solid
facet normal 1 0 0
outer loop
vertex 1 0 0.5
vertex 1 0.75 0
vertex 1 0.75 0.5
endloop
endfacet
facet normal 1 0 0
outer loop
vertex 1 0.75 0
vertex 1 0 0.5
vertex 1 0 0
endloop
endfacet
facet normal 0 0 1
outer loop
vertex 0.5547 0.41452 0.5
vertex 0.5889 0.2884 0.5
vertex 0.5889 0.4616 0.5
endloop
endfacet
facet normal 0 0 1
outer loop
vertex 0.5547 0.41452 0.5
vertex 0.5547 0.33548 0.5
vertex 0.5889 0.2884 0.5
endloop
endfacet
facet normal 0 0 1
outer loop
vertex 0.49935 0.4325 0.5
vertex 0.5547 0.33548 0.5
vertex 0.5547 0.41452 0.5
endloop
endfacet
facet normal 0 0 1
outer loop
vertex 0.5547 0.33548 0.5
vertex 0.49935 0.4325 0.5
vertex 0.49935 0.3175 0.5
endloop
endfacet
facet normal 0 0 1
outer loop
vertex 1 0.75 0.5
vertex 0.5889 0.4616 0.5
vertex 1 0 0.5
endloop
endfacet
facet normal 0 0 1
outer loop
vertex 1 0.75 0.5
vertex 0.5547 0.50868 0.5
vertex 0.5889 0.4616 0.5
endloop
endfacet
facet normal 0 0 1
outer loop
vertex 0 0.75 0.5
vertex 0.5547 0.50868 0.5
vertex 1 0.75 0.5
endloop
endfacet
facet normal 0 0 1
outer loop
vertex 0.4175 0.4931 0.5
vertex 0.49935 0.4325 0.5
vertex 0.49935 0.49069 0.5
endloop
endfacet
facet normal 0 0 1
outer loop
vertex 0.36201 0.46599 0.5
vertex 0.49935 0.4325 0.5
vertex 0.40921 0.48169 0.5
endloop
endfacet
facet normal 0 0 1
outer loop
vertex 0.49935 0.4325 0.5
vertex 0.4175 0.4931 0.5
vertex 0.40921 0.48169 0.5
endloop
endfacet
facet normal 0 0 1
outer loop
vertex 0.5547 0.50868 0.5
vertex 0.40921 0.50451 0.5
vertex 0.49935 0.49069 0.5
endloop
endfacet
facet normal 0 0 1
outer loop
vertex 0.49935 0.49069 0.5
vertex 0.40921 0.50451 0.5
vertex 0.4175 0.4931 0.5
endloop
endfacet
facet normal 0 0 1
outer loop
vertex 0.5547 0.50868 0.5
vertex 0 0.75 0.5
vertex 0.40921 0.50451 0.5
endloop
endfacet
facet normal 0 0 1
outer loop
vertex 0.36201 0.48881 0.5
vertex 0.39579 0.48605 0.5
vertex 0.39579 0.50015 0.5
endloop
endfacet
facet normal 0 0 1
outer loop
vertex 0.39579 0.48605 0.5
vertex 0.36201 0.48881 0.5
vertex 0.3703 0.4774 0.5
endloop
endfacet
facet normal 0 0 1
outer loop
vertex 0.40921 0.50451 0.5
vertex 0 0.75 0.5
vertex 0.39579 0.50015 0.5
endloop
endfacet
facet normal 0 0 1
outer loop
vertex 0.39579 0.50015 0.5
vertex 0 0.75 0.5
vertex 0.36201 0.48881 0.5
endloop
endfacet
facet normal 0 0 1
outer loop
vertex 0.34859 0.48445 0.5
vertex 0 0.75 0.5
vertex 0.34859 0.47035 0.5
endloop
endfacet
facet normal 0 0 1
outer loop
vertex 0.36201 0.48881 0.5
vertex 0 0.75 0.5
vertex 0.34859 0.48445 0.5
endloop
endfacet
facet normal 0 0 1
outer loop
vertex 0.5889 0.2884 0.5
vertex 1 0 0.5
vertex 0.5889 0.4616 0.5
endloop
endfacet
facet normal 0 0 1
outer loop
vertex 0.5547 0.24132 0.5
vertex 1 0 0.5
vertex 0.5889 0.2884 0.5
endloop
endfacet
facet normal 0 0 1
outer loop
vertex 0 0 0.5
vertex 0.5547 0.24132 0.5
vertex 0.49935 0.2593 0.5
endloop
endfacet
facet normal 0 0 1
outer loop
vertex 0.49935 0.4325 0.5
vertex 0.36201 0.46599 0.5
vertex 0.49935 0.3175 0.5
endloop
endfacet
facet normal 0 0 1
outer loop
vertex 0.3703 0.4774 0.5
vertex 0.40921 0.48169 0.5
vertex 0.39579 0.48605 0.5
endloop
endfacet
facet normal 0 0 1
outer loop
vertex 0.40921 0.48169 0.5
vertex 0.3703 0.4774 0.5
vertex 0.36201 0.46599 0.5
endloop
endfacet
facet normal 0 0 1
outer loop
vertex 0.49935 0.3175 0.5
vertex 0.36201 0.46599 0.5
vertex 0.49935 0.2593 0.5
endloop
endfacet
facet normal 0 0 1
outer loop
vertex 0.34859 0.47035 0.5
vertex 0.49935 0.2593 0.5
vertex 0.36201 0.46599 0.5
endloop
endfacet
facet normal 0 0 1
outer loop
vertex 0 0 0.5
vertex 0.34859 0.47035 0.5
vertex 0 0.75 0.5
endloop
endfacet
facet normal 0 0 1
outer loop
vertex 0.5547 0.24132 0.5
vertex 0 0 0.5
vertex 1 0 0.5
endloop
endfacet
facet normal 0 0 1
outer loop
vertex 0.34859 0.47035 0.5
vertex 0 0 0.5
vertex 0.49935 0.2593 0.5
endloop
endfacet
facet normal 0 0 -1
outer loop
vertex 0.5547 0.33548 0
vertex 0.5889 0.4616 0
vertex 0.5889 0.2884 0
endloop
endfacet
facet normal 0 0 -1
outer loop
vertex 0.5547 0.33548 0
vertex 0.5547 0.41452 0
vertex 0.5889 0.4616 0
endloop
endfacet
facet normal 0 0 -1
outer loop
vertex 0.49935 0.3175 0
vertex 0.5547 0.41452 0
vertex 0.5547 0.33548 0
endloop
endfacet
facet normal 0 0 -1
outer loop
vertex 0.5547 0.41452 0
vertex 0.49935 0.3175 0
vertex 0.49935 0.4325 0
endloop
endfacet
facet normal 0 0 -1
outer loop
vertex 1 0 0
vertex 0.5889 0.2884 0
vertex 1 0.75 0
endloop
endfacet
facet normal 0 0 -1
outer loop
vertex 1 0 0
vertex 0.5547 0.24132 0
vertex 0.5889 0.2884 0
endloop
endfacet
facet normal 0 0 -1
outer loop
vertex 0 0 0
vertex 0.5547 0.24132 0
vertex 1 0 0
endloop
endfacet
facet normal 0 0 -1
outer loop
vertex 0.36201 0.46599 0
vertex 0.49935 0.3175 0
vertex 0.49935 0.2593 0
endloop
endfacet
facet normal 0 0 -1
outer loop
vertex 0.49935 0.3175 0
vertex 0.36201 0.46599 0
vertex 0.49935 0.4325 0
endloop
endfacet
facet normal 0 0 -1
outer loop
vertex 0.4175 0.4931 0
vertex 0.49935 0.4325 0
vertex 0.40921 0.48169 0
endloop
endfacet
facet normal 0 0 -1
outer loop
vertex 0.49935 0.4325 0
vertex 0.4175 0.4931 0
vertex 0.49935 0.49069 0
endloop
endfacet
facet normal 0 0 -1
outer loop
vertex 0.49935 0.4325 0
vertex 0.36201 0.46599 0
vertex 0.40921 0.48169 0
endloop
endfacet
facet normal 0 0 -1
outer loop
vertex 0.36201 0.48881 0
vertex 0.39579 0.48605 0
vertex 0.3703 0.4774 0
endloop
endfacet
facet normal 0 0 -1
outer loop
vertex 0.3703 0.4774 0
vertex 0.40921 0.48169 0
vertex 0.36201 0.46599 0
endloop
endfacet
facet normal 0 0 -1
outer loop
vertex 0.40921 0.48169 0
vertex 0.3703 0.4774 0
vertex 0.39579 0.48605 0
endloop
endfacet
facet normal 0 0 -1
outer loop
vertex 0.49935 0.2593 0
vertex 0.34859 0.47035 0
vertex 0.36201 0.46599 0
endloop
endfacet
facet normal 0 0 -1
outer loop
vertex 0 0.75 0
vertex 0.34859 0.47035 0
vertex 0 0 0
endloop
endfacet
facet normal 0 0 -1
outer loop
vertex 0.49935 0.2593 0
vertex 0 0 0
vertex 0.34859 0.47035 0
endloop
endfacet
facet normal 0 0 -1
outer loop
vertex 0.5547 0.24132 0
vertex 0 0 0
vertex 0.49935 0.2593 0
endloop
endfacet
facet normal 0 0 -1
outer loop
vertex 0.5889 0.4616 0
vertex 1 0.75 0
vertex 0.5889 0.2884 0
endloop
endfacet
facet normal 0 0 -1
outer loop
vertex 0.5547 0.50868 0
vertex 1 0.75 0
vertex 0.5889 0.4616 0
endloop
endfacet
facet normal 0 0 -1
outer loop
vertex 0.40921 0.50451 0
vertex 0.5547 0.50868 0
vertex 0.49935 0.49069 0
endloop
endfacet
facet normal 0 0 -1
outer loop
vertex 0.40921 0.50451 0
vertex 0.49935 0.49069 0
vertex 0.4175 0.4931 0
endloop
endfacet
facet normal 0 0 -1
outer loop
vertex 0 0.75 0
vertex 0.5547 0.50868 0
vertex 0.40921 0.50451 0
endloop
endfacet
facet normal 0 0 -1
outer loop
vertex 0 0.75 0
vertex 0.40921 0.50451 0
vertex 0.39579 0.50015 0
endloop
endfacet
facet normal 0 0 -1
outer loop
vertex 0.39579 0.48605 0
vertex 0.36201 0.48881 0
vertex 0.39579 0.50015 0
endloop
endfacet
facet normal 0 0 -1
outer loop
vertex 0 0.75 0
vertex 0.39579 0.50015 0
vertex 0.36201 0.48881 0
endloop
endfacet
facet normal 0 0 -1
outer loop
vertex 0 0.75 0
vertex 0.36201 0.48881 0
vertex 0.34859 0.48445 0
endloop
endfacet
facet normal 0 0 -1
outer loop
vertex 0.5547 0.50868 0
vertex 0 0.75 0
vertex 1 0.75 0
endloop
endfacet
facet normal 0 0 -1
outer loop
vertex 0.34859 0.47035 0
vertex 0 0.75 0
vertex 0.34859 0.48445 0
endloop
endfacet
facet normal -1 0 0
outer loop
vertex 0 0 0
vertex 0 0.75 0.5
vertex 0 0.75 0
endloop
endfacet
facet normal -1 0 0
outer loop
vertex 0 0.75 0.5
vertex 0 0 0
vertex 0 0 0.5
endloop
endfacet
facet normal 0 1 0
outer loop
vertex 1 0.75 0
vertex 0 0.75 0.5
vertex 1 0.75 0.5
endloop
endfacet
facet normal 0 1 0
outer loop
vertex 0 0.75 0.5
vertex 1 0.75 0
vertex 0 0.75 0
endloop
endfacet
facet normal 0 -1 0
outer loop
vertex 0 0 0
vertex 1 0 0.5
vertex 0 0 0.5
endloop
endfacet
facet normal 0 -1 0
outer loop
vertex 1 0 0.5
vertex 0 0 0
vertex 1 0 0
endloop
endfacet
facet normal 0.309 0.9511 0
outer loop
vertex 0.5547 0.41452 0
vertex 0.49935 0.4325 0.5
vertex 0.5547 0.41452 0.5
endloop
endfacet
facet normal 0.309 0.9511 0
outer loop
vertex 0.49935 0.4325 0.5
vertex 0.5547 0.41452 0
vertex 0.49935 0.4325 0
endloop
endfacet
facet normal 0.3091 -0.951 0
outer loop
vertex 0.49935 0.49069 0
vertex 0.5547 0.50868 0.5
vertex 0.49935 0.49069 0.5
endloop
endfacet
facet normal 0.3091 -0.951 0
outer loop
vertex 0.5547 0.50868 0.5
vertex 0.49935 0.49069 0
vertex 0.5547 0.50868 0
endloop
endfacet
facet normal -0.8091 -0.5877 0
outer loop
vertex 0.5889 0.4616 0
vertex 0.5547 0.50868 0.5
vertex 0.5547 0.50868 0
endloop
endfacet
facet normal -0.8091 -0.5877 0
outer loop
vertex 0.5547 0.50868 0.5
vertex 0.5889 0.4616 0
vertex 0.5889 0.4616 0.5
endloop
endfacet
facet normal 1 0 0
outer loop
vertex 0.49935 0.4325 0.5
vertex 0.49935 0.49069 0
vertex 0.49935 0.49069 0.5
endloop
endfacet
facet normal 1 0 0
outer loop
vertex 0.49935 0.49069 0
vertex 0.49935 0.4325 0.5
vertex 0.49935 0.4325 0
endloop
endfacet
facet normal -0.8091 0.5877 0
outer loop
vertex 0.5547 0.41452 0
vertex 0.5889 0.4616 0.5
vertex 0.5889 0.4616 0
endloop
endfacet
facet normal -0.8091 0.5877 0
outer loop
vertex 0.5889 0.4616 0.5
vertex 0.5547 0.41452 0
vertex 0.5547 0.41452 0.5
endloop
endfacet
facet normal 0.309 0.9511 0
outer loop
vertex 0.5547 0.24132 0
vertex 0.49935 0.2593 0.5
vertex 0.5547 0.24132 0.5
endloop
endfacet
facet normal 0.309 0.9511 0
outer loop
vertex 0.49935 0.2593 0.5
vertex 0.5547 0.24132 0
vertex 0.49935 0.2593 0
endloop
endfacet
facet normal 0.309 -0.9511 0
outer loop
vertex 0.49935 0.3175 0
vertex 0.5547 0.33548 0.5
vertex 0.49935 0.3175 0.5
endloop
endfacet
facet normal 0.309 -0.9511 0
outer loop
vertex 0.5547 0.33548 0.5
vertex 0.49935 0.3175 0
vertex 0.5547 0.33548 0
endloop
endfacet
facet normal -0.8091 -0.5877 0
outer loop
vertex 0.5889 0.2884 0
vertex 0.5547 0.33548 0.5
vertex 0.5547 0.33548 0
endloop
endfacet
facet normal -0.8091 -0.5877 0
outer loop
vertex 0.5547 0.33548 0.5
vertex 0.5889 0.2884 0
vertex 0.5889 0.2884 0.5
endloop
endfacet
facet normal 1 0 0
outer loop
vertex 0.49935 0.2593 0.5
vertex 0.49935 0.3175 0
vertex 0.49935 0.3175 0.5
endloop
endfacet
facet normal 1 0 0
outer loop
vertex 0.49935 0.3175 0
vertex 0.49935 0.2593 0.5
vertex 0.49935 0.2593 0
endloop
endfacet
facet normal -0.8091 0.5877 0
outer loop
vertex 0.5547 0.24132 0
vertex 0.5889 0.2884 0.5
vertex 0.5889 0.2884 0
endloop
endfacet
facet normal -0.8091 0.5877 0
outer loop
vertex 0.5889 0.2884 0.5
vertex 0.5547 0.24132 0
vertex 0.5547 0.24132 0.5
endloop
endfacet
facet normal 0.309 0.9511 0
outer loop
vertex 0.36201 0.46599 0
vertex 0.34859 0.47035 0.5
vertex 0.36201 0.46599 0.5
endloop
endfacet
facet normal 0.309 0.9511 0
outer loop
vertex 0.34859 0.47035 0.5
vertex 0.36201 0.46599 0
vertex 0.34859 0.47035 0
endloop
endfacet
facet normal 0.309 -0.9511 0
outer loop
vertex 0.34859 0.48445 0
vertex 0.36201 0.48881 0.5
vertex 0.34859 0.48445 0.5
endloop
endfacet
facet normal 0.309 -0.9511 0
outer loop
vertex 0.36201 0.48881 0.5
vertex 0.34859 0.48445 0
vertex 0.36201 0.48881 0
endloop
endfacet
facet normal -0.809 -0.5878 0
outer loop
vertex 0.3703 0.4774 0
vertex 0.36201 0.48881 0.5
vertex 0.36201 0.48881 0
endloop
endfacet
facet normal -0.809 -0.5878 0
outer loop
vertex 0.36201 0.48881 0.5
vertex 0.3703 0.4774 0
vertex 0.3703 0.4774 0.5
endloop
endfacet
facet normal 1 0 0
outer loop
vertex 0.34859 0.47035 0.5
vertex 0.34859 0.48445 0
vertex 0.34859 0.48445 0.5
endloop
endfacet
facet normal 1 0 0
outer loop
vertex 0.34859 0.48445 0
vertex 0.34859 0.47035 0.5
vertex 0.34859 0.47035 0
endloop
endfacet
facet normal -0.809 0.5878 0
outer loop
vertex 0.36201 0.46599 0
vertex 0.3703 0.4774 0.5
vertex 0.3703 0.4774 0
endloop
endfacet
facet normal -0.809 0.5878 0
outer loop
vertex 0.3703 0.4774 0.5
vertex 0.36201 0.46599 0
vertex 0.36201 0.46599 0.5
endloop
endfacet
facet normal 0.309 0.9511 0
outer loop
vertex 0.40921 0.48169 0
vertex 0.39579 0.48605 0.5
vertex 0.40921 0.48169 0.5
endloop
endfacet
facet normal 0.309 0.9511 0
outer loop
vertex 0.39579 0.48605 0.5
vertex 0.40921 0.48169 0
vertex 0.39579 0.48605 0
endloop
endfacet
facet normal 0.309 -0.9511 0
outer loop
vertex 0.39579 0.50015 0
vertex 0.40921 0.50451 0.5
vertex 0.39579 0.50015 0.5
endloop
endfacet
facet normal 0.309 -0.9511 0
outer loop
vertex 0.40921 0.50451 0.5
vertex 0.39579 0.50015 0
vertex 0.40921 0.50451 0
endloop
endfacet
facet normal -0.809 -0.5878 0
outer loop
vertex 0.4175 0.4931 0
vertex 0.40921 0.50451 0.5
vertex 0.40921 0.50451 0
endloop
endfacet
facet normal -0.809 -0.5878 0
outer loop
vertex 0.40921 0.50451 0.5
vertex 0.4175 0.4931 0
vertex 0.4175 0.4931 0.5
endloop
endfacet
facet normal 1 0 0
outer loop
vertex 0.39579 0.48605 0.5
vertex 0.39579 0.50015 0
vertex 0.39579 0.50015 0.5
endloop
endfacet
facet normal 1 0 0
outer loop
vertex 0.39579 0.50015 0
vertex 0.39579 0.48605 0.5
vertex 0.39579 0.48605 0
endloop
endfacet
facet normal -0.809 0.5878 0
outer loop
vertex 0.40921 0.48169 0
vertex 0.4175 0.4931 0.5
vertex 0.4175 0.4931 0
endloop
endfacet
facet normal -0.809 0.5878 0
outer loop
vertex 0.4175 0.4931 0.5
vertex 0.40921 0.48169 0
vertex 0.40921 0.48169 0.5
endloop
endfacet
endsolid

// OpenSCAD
difference() {
	cube([1,.75,.5]);
	translate([.5394,.4616,0])
		cylinder(h = .5, r1 = .0495, r2 = .0495, center = false);
	translate([.5394,.375-.0866,0])
		cylinder(h = .5, r1 = .0495, r2 = .0495, center = false);
	translate([.5-.1417,.4774,0])
		cylinder(h = .5, r1 = .012, r2 = .012, center = false);
	translate([.5-.0945,.375+.1181,0])
		cylinder(h = .5, r1 = .012, r2 = .012, center = false);
}
